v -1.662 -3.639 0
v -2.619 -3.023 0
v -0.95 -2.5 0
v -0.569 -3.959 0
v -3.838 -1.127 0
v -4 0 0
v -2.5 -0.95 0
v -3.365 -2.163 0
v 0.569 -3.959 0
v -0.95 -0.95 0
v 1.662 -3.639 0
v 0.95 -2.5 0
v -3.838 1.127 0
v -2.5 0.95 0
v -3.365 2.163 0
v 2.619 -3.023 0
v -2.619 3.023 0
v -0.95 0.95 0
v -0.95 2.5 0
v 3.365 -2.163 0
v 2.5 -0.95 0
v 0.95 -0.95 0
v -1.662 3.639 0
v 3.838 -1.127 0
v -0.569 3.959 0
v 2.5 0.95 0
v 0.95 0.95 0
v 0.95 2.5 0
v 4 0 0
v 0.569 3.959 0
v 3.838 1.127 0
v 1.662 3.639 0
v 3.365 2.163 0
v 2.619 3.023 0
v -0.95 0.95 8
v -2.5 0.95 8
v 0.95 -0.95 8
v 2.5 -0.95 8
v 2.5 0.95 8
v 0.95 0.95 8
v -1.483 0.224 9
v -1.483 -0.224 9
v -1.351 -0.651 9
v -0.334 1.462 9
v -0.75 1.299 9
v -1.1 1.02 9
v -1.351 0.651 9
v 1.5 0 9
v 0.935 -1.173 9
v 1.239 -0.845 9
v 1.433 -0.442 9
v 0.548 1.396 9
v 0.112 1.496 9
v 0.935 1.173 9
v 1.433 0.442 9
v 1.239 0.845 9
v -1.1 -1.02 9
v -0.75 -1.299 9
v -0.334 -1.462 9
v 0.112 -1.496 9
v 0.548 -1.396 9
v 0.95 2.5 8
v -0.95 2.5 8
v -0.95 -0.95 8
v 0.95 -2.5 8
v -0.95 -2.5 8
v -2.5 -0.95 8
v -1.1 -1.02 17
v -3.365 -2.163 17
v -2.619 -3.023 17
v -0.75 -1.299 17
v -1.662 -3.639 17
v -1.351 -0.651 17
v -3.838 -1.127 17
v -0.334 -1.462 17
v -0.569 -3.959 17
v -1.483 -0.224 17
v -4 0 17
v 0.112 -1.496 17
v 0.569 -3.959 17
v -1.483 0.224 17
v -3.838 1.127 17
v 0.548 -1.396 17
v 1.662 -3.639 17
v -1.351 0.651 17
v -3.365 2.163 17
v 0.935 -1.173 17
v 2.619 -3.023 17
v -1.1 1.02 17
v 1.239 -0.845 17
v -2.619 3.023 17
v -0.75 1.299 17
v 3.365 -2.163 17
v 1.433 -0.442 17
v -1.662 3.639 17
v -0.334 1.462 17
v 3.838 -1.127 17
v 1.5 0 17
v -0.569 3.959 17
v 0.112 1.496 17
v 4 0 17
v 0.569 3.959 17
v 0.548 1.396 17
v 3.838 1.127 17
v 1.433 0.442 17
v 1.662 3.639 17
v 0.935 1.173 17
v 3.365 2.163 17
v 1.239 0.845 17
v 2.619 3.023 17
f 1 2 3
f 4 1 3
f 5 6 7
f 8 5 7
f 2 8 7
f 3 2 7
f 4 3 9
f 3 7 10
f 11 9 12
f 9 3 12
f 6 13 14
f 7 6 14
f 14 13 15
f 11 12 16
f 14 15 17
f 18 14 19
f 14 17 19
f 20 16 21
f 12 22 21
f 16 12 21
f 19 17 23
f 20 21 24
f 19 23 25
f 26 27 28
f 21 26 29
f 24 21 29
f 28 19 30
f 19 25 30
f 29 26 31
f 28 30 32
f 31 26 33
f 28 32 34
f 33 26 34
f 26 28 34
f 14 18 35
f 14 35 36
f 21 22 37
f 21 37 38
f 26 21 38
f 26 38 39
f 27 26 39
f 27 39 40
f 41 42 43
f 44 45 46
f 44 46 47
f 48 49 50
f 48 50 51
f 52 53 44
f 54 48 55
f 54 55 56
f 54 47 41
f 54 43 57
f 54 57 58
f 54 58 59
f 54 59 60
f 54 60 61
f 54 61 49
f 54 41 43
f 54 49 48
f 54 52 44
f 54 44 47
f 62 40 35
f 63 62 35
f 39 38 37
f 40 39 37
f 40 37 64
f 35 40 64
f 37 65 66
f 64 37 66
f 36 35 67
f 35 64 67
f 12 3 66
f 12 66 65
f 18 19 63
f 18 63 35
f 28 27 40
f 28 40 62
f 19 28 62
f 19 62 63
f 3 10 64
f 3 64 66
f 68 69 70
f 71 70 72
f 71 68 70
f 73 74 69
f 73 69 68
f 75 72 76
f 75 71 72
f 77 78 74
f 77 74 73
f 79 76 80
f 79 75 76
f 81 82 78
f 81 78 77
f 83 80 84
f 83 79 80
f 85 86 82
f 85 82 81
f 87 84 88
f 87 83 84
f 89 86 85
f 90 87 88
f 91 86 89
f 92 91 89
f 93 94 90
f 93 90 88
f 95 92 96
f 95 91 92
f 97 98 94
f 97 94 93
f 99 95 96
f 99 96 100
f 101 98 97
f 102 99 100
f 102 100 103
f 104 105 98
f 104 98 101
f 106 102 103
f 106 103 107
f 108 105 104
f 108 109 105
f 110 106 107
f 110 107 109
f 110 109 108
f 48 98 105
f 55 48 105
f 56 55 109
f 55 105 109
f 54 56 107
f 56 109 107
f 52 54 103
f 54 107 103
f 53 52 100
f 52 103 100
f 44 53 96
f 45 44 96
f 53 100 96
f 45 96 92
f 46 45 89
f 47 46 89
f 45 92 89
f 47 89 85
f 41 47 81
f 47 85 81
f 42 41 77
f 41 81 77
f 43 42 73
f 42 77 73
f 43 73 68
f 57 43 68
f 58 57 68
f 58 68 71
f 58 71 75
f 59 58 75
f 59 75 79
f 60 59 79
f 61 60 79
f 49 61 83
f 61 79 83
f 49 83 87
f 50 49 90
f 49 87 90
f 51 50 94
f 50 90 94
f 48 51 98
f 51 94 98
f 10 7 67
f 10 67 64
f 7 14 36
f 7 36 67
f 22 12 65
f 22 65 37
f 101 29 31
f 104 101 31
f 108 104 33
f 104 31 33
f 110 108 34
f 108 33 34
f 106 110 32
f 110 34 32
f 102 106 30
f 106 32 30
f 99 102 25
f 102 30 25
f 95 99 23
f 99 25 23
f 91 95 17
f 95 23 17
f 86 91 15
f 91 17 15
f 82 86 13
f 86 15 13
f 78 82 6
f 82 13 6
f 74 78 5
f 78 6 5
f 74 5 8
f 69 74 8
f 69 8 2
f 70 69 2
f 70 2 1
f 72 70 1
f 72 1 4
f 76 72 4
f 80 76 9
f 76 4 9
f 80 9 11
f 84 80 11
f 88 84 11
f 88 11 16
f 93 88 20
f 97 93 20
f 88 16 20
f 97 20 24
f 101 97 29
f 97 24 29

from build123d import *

# Parameters (mm, degrees)
SKETCH004_R     = 4
PAD002_DEPTH    = 17
SKETCH005_R     = 1.5
POCKET002_DEPTH = 8
POCKET003_DEPTH = 8


with BuildPart() as part:
    # Sketch004 → Pad002 (new body)
    with BuildSketch(Plane.XY):
        Circle(SKETCH004_R)
    extrude(amount=PAD002_DEPTH)

    # Sketch005 → Pocket002 (cut)
    with BuildSketch(Plane.XY.offset(17)):
        Circle(SKETCH005_R)
    extrude(amount=-POCKET002_DEPTH, mode=Mode.SUBTRACT)

    # Sketch006 → Pocket003 (cut)
    with BuildSketch(Plane(origin=(0, 0, 0), x_dir=(1, 0, 0), z_dir=(0, 0, -1))):
        Polygon((-0.95, 2.5), (0.95, 2.5), (0.95, 0.95), (2.5, 0.95), (2.5, -0.95), (0.95, -0.95), (0.95, -2.5), (-0.95, -2.5), (-0.95, -0.95), (-2.5, -0.95), (-2.5, 0.95), (-0.95, 0.95), align=None)
    extrude(amount=-POCKET003_DEPTH, mode=Mode.SUBTRACT)


solid = part.part
